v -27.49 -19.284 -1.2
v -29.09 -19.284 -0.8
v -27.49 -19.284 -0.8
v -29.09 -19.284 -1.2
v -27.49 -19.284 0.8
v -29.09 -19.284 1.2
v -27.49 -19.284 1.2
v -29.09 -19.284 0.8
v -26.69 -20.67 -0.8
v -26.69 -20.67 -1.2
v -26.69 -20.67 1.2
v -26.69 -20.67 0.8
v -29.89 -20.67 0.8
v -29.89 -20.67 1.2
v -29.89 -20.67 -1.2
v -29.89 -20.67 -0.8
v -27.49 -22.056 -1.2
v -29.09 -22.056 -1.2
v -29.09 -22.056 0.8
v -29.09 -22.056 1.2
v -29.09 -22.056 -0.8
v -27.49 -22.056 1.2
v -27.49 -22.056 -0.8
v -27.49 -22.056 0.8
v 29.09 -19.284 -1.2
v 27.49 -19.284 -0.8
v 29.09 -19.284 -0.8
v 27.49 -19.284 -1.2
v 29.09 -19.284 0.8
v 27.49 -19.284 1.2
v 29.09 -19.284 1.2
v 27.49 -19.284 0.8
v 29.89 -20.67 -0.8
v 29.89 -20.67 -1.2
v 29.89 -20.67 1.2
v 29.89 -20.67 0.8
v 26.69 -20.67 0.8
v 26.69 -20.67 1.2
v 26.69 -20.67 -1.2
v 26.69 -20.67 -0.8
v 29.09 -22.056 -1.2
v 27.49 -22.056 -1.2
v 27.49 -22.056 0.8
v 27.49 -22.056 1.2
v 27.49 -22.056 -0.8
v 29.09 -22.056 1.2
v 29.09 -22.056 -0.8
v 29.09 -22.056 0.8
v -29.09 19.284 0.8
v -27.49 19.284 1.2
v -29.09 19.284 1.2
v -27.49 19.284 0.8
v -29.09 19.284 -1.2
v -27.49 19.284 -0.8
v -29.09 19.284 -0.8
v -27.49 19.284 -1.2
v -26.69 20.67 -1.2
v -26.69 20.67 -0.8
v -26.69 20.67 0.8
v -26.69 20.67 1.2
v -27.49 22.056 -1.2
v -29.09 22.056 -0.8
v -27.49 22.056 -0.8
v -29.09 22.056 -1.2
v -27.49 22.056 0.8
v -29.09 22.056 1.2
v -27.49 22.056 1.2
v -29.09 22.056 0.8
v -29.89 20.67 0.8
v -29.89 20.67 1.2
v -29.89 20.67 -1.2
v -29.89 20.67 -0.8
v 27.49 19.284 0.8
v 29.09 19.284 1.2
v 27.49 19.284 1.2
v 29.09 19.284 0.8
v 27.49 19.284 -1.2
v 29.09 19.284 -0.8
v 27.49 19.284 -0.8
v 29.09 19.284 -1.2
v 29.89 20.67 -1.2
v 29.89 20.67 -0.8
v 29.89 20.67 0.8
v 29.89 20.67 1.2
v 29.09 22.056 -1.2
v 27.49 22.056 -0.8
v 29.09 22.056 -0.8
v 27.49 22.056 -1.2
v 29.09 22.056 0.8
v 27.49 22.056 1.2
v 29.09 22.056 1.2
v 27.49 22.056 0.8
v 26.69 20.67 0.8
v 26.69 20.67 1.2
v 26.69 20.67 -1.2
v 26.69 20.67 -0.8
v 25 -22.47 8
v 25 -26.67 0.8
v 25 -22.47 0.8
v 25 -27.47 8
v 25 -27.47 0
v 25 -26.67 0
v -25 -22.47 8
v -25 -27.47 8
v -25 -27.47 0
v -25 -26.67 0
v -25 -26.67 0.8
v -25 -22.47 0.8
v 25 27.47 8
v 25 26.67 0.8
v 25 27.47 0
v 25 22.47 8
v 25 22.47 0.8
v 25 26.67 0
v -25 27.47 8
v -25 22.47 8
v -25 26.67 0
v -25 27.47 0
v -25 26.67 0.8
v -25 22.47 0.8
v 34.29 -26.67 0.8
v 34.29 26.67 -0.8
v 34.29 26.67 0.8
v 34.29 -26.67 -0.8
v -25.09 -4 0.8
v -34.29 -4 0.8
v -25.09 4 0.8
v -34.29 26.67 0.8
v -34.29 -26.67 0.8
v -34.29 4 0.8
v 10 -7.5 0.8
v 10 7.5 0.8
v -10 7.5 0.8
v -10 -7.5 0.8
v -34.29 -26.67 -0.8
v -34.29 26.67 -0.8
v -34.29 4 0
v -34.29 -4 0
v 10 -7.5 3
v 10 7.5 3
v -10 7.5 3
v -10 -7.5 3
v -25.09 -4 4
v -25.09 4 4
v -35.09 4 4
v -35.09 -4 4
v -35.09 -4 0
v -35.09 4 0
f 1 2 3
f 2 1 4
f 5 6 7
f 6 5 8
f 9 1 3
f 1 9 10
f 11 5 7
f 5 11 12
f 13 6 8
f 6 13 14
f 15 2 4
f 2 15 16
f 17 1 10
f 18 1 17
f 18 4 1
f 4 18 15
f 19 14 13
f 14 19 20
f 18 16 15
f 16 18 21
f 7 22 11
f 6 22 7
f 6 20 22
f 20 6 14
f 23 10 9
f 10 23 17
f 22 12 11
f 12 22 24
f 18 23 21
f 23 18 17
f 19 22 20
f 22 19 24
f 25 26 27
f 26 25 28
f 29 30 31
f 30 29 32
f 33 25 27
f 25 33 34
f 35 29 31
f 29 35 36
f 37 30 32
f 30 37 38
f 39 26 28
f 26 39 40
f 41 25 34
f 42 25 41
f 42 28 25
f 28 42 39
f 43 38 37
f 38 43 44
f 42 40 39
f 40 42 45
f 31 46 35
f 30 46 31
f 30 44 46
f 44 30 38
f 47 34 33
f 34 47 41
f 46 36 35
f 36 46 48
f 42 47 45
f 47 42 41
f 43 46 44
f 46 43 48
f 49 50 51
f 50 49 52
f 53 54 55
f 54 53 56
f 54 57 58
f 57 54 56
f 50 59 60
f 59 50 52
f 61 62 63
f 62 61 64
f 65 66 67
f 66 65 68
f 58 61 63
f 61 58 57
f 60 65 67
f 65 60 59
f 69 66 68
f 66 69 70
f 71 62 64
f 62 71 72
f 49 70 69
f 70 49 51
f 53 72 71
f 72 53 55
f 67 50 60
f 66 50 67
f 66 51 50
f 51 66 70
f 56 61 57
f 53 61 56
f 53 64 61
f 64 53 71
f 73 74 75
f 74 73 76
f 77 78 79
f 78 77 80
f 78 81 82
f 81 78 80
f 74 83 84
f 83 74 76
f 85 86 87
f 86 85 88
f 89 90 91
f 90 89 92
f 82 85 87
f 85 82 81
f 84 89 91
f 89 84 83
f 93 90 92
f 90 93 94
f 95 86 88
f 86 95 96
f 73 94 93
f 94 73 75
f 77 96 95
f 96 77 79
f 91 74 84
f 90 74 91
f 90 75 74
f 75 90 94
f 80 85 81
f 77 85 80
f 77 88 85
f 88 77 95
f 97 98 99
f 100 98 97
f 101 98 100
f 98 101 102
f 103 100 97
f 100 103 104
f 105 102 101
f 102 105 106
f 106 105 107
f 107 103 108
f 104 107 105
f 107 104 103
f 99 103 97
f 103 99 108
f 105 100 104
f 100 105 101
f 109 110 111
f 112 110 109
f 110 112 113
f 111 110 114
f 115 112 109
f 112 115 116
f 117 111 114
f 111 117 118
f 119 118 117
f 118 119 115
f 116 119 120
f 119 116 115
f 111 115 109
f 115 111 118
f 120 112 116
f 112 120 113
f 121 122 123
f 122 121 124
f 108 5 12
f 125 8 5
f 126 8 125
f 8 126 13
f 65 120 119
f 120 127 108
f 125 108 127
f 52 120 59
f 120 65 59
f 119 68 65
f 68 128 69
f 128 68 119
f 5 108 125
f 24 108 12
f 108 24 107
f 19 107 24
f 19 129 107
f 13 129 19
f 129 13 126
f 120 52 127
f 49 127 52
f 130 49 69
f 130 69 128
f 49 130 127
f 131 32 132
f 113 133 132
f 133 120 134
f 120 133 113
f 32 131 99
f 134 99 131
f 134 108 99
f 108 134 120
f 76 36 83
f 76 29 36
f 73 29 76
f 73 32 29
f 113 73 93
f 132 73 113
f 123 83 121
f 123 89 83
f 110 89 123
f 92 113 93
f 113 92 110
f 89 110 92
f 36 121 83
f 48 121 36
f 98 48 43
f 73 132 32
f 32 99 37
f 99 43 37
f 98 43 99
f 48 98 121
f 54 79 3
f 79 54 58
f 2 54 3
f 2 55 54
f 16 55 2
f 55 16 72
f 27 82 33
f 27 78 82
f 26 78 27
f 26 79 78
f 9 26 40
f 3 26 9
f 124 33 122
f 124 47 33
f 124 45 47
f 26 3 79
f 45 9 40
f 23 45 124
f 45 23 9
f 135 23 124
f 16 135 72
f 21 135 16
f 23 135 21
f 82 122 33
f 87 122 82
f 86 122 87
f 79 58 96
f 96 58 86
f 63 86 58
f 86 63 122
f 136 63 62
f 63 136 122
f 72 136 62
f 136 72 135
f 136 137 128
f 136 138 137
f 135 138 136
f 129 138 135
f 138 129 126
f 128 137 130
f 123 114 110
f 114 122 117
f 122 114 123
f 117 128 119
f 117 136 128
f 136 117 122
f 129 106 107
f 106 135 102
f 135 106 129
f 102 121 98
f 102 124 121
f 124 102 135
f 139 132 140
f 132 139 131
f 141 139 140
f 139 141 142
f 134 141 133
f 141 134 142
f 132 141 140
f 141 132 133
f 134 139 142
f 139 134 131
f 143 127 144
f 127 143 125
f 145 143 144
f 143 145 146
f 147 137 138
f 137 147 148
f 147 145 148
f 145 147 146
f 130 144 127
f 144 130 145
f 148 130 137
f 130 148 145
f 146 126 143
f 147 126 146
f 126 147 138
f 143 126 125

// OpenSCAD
// Parameters
pcb_L = 68.58; //[34.29:137.16:0.01]
pcb_W = 53.34; //[26.67:106.68:0.01]
pcb_T = 1.6; //[0.8:3.2:0.1]
overlap = 0.8; //[0.5:2.0:0.1]
placeholder_T = 0.4; //[0.2:1.0:0.1]
mount_hole_r = 1.6; //[0.8:3.2:0.1]
mount_hole_offset_x = 6.0; //[3.0:12.0:0.5]
mount_hole_offset_y = 6.0; //[3.0:12.0:0.5]
header_L = 50.0; //[25.0:100.0:0.5]
header_W = 5.0; //[2.5:10.0:0.5]
header_H = 8.0; //[4.0:16.0:0.5]
usb_L = 10.0; //[5.0:20.0:0.5]
usb_W = 8.0; //[4.0:16.0:0.5]
usb_H = 4.0; //[2.0:10.0:0.5]
comp_L = 20.0; //[10.0:40.0:0.5]
comp_W = 15.0; //[7.5:30.0:0.5]
comp_H = 3.0; //[1.5:8.0:0.5]

// Main PCB Body
module pcb_main_body() {
  color([0.0, 0.4, 0.2]) // Green PCB
  cube([pcb_L, pcb_W, pcb_T], center=true);
}

// Edge Rounding
module edge_rounding() {
  color([0.0, 0.4, 0.2]) // Green PCB
  translate([0, 0, pcb_T/2 - overlap - placeholder_T/2])
    cube([pcb_L, pcb_W, placeholder_T], center=true);
}

// Silkscreen Markings
module silkscreen_markings() {
  color([0.0, 0.4, 0.2]) // Green PCB
  translate([0, 0, pcb_T/2 - overlap - placeholder_T/2])
    cube([pcb_L*0.9, pcb_W*0.9, placeholder_T], center=true);
}

// Mounting Holes
module mounting_hole() {
  color("Black")
  cylinder(h=pcb_T + 2*placeholder_T, r=mount_hole_r, center=true);
}

module mounting_holes() {
  union() {
    translate([-pcb_L/2 + mount_hole_offset_x, -pcb_W/2 + mount_hole_offset_y, 0]) mounting_hole();
    translate([pcb_L/2 - mount_hole_offset_x, -pcb_W/2 + mount_hole_offset_y, 0]) mounting_hole();
    translate([-pcb_L/2 + mount_hole_offset_x, pcb_W/2 - mount_hole_offset_y, 0]) mounting_hole();
    translate([pcb_L/2 - mount_hole_offset_x, pcb_W/2 - mount_hole_offset_y, 0]) mounting_hole();
  }
}

// Pin Headers
module pin_header() {
  color("Black")
  cube([header_L, header_W, header_H], center=true);
}

module pin_headers() {
  union() {
    translate([0, -pcb_W/2 + header_W/2 - overlap, pcb_T/2 + header_H/2 - overlap]) pin_header();
    translate([0, pcb_W/2 - header_W/2 + overlap, pcb_T/2 + header_H/2 - overlap]) pin_header();
  }
}

// USB Connector
module usb_connector() {
  color("Black")
  translate([-pcb_L/2 + usb_L/2 - overlap, 0, pcb_T/2 + usb_H/2 - overlap])
    cube([usb_L, usb_W, usb_H], center=true);
}

// Component Placeholders
module component_placeholders() {
  color("Black")
  translate([0, 0, pcb_T/2 + comp_H/2 - overlap])
    cube([comp_L, comp_W, comp_H], center=true);
}

// Complete Board
module board_complete() {
  union() {
    pcb_main_body();
    edge_rounding();
    silkscreen_markings();
    mounting_holes();
    component_placeholders();
    pin_headers();
    usb_connector();
  }
}

// Final Output
board_complete();
